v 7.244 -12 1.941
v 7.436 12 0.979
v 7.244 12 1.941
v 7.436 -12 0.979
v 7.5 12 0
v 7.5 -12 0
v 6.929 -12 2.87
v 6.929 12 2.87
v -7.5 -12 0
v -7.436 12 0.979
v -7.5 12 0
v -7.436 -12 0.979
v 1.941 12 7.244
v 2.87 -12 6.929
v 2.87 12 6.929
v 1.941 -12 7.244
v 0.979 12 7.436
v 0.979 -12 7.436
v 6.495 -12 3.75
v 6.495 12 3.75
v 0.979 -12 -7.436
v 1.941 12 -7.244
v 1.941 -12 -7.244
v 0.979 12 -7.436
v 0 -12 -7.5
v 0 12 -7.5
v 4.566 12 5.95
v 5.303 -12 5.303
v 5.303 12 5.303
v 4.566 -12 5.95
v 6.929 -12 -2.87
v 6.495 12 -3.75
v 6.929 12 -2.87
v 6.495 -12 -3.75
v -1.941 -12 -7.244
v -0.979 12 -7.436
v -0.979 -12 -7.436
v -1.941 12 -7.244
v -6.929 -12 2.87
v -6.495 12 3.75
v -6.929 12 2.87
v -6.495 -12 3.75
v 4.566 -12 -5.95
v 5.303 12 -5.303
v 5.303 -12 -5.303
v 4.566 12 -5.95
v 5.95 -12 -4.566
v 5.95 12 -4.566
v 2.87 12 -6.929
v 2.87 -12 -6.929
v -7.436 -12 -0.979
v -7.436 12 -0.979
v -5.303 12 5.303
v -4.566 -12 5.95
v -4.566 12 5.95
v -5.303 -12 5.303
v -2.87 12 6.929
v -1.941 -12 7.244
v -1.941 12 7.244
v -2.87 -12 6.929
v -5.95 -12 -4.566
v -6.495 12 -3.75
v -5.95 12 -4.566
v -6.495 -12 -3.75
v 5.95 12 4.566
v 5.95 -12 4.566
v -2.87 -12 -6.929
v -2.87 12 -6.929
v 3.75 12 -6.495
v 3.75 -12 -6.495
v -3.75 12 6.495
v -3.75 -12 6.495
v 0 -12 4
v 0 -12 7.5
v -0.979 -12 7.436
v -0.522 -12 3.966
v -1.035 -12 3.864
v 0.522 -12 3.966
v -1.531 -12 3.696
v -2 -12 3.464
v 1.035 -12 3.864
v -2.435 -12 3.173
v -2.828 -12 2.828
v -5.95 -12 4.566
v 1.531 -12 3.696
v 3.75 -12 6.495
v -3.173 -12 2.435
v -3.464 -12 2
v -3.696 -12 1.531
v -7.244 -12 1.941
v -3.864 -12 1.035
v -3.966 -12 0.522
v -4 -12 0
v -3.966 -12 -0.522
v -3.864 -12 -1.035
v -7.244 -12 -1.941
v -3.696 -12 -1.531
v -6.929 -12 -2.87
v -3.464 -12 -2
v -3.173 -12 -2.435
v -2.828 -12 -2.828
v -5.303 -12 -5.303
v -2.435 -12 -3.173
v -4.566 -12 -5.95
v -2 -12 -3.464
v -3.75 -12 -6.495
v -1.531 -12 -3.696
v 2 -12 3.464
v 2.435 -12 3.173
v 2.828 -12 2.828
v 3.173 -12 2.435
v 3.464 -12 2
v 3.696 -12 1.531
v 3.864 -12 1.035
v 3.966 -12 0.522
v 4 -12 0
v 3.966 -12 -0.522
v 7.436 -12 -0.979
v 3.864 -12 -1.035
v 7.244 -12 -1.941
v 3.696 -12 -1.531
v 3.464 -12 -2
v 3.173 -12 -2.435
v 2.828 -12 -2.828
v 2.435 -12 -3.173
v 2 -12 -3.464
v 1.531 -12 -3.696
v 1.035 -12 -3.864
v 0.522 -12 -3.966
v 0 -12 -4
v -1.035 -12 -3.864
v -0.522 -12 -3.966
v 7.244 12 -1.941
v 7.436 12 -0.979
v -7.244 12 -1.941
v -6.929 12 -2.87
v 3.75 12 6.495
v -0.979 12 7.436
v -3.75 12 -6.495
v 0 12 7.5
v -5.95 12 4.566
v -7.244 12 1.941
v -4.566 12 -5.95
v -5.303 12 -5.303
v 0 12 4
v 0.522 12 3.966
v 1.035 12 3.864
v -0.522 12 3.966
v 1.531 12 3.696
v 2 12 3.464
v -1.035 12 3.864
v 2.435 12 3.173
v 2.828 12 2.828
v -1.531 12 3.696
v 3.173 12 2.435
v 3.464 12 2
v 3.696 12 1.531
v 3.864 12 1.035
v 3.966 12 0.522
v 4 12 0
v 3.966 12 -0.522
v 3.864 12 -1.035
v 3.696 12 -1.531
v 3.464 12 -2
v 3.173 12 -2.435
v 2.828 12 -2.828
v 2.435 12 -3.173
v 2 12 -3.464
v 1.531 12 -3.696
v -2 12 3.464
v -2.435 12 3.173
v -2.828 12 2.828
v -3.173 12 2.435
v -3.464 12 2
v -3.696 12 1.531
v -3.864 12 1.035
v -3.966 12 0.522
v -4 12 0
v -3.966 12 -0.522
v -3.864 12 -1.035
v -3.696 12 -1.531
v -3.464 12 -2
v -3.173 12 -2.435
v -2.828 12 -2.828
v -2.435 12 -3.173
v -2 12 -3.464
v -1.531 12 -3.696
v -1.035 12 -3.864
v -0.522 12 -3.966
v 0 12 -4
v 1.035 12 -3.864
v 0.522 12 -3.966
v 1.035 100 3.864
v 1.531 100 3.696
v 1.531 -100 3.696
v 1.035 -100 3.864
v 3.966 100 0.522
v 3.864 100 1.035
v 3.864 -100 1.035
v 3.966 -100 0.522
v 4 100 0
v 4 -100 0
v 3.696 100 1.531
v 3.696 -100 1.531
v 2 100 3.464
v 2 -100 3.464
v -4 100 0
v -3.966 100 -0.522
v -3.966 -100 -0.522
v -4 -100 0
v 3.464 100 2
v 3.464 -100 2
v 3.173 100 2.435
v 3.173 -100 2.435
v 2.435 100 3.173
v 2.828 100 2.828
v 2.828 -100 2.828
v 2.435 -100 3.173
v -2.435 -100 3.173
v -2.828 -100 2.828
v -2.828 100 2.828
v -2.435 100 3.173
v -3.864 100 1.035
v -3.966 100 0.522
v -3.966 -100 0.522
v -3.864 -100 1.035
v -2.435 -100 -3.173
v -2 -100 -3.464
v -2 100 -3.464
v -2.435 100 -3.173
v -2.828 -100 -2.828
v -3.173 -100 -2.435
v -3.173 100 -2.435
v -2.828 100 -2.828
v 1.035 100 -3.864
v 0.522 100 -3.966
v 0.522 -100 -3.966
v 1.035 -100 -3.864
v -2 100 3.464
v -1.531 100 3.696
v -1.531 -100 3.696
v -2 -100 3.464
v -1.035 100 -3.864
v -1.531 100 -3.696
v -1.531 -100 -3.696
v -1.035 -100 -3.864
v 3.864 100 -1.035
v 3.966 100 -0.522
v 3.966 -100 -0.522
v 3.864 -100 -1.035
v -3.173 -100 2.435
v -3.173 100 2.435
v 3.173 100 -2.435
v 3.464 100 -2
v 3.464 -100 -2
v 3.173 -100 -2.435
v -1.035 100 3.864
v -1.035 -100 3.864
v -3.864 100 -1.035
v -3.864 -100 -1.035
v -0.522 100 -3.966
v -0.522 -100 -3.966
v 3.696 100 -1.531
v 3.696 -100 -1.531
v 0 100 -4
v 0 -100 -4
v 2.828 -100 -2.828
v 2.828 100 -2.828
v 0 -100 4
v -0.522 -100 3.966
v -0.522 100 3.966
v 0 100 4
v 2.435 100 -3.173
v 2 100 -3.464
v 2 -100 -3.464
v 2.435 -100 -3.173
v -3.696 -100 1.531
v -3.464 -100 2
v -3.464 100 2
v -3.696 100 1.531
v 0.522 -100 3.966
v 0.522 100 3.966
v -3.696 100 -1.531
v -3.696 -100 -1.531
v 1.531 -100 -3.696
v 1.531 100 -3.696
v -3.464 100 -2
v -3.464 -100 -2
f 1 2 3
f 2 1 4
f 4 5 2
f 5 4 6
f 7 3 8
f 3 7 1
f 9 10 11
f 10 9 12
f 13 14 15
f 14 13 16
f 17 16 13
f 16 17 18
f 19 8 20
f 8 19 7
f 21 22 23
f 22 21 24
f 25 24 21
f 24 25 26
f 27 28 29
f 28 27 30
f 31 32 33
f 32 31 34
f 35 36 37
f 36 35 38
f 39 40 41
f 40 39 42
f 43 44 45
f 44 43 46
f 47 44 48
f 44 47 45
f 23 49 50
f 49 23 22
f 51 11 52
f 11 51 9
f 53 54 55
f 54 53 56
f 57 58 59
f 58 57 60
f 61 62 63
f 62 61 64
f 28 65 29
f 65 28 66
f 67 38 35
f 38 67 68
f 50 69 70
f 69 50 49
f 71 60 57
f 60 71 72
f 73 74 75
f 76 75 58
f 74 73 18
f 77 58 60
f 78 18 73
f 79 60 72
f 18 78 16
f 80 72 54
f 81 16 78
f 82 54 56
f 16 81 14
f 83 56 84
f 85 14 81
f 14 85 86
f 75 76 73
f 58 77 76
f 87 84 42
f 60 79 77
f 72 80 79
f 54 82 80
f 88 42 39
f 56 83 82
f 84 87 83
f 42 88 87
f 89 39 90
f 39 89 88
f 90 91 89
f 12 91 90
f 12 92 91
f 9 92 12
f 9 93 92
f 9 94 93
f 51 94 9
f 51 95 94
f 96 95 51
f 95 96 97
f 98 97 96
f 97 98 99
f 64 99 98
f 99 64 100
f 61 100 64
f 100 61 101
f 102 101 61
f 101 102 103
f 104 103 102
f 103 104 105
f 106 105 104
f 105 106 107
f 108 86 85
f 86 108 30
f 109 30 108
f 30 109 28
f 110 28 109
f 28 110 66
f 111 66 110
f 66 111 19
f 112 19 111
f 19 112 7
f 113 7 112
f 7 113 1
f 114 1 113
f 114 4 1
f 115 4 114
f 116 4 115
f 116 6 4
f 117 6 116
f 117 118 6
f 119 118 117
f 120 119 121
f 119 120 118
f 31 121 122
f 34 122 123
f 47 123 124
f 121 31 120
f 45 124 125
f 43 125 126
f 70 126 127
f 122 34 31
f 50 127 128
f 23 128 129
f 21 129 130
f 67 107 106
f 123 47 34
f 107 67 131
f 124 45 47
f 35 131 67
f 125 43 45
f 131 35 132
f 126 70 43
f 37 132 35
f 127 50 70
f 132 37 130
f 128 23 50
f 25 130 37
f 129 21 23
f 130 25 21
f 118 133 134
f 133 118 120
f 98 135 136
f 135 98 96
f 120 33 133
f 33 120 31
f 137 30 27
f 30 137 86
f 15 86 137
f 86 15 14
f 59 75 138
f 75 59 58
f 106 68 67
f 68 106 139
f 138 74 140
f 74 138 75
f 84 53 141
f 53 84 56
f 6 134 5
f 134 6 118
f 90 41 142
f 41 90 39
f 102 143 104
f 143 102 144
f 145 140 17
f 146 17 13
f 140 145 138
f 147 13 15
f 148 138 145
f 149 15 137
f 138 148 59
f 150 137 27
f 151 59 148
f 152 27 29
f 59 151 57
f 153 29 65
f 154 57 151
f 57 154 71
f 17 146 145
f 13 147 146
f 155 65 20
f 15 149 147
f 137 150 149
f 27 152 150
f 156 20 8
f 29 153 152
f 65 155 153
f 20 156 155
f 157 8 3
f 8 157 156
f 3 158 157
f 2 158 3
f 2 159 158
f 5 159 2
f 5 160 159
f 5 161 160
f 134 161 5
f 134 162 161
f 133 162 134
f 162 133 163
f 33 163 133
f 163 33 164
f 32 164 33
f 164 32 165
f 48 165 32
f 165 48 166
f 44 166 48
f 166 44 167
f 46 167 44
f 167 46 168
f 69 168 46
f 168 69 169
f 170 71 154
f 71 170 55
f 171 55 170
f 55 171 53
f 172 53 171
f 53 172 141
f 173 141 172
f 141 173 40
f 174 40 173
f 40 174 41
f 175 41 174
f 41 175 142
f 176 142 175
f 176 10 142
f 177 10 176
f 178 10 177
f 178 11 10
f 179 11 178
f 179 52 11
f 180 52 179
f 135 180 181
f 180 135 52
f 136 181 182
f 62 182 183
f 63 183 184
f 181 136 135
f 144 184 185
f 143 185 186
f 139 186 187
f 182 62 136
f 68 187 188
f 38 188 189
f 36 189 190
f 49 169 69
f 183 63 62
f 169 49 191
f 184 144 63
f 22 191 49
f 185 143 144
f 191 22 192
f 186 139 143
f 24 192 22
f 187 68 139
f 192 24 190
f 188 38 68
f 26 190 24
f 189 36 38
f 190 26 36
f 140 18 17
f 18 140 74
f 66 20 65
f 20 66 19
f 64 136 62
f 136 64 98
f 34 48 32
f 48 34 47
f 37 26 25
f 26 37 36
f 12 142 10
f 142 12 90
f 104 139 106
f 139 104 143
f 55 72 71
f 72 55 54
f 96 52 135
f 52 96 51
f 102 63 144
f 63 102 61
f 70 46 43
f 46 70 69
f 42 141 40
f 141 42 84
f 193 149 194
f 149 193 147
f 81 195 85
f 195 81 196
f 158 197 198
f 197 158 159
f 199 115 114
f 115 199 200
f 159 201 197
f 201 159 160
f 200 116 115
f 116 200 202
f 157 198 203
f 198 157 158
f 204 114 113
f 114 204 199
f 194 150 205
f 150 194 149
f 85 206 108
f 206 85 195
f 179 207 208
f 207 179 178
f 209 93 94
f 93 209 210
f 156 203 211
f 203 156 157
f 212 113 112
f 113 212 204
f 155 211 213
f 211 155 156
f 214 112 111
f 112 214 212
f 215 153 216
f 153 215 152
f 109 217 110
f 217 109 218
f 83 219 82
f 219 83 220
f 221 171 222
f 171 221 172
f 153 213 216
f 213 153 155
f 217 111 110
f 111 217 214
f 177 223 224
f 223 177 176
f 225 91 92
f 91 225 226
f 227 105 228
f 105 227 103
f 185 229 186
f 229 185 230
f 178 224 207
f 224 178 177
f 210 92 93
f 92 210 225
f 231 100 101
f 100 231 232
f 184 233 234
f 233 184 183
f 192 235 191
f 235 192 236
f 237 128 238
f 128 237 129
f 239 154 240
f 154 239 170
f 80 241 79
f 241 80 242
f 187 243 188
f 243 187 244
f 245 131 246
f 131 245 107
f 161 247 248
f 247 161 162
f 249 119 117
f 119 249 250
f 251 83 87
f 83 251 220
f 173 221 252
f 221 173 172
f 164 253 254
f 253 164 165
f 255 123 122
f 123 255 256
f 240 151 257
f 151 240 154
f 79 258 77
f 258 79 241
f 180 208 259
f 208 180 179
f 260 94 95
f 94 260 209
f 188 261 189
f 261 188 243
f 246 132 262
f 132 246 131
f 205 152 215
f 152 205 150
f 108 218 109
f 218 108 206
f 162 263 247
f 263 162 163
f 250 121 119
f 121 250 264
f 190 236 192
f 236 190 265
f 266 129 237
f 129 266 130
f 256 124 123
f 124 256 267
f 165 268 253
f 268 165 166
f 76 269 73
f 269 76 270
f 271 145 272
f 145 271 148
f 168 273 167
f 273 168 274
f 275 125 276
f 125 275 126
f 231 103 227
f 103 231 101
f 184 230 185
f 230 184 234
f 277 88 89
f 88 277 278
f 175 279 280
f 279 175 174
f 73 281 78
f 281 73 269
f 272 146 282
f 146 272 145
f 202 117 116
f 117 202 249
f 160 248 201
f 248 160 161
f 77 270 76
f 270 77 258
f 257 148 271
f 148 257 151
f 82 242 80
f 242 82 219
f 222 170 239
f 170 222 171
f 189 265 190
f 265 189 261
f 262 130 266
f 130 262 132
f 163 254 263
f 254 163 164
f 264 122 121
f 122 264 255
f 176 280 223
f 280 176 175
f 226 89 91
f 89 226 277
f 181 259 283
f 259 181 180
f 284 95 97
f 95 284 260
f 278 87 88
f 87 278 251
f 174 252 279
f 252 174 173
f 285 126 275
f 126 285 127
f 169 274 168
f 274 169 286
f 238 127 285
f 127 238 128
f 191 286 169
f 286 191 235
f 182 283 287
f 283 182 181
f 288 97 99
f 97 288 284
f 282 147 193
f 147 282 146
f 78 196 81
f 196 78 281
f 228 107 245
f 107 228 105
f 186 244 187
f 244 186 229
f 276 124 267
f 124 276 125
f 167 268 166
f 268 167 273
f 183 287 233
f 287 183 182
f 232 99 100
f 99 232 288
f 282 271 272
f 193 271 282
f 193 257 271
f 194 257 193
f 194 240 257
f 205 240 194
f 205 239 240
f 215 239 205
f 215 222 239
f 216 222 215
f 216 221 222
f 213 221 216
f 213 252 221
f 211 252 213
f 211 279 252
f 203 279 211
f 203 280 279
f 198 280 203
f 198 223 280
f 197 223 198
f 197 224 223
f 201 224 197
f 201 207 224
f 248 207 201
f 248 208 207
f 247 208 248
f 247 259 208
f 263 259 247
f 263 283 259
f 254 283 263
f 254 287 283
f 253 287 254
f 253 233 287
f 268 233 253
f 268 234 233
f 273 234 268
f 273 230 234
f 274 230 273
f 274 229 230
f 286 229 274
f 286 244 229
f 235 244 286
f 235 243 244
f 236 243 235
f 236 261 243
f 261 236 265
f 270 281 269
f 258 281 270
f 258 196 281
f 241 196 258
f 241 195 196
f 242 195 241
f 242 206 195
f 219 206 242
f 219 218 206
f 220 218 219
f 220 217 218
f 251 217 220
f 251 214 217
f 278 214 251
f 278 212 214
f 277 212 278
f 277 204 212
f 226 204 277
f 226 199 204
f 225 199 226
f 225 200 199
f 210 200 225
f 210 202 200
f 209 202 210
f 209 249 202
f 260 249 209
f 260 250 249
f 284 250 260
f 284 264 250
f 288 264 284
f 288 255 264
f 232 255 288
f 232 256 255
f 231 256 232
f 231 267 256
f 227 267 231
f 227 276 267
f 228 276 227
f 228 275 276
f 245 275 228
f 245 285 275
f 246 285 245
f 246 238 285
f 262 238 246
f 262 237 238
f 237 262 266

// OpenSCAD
//Cheap linear bearing and rod

ep=0.001;//epsilon
epp=ep*2;
$fn=48;

module linear_bearing(id=8,od=15,l=24){
	rotate([90,0,0])difference(){
		cylinder(l,d=od,center=true);
		cylinder(l+epp,d=id,center=true);
	}

}
module linear_rod(d=8,h=200){
	rotate([90,0,0])cylinder(h,d=d,center=true);
}
linear_bearing();
linear_rod();
